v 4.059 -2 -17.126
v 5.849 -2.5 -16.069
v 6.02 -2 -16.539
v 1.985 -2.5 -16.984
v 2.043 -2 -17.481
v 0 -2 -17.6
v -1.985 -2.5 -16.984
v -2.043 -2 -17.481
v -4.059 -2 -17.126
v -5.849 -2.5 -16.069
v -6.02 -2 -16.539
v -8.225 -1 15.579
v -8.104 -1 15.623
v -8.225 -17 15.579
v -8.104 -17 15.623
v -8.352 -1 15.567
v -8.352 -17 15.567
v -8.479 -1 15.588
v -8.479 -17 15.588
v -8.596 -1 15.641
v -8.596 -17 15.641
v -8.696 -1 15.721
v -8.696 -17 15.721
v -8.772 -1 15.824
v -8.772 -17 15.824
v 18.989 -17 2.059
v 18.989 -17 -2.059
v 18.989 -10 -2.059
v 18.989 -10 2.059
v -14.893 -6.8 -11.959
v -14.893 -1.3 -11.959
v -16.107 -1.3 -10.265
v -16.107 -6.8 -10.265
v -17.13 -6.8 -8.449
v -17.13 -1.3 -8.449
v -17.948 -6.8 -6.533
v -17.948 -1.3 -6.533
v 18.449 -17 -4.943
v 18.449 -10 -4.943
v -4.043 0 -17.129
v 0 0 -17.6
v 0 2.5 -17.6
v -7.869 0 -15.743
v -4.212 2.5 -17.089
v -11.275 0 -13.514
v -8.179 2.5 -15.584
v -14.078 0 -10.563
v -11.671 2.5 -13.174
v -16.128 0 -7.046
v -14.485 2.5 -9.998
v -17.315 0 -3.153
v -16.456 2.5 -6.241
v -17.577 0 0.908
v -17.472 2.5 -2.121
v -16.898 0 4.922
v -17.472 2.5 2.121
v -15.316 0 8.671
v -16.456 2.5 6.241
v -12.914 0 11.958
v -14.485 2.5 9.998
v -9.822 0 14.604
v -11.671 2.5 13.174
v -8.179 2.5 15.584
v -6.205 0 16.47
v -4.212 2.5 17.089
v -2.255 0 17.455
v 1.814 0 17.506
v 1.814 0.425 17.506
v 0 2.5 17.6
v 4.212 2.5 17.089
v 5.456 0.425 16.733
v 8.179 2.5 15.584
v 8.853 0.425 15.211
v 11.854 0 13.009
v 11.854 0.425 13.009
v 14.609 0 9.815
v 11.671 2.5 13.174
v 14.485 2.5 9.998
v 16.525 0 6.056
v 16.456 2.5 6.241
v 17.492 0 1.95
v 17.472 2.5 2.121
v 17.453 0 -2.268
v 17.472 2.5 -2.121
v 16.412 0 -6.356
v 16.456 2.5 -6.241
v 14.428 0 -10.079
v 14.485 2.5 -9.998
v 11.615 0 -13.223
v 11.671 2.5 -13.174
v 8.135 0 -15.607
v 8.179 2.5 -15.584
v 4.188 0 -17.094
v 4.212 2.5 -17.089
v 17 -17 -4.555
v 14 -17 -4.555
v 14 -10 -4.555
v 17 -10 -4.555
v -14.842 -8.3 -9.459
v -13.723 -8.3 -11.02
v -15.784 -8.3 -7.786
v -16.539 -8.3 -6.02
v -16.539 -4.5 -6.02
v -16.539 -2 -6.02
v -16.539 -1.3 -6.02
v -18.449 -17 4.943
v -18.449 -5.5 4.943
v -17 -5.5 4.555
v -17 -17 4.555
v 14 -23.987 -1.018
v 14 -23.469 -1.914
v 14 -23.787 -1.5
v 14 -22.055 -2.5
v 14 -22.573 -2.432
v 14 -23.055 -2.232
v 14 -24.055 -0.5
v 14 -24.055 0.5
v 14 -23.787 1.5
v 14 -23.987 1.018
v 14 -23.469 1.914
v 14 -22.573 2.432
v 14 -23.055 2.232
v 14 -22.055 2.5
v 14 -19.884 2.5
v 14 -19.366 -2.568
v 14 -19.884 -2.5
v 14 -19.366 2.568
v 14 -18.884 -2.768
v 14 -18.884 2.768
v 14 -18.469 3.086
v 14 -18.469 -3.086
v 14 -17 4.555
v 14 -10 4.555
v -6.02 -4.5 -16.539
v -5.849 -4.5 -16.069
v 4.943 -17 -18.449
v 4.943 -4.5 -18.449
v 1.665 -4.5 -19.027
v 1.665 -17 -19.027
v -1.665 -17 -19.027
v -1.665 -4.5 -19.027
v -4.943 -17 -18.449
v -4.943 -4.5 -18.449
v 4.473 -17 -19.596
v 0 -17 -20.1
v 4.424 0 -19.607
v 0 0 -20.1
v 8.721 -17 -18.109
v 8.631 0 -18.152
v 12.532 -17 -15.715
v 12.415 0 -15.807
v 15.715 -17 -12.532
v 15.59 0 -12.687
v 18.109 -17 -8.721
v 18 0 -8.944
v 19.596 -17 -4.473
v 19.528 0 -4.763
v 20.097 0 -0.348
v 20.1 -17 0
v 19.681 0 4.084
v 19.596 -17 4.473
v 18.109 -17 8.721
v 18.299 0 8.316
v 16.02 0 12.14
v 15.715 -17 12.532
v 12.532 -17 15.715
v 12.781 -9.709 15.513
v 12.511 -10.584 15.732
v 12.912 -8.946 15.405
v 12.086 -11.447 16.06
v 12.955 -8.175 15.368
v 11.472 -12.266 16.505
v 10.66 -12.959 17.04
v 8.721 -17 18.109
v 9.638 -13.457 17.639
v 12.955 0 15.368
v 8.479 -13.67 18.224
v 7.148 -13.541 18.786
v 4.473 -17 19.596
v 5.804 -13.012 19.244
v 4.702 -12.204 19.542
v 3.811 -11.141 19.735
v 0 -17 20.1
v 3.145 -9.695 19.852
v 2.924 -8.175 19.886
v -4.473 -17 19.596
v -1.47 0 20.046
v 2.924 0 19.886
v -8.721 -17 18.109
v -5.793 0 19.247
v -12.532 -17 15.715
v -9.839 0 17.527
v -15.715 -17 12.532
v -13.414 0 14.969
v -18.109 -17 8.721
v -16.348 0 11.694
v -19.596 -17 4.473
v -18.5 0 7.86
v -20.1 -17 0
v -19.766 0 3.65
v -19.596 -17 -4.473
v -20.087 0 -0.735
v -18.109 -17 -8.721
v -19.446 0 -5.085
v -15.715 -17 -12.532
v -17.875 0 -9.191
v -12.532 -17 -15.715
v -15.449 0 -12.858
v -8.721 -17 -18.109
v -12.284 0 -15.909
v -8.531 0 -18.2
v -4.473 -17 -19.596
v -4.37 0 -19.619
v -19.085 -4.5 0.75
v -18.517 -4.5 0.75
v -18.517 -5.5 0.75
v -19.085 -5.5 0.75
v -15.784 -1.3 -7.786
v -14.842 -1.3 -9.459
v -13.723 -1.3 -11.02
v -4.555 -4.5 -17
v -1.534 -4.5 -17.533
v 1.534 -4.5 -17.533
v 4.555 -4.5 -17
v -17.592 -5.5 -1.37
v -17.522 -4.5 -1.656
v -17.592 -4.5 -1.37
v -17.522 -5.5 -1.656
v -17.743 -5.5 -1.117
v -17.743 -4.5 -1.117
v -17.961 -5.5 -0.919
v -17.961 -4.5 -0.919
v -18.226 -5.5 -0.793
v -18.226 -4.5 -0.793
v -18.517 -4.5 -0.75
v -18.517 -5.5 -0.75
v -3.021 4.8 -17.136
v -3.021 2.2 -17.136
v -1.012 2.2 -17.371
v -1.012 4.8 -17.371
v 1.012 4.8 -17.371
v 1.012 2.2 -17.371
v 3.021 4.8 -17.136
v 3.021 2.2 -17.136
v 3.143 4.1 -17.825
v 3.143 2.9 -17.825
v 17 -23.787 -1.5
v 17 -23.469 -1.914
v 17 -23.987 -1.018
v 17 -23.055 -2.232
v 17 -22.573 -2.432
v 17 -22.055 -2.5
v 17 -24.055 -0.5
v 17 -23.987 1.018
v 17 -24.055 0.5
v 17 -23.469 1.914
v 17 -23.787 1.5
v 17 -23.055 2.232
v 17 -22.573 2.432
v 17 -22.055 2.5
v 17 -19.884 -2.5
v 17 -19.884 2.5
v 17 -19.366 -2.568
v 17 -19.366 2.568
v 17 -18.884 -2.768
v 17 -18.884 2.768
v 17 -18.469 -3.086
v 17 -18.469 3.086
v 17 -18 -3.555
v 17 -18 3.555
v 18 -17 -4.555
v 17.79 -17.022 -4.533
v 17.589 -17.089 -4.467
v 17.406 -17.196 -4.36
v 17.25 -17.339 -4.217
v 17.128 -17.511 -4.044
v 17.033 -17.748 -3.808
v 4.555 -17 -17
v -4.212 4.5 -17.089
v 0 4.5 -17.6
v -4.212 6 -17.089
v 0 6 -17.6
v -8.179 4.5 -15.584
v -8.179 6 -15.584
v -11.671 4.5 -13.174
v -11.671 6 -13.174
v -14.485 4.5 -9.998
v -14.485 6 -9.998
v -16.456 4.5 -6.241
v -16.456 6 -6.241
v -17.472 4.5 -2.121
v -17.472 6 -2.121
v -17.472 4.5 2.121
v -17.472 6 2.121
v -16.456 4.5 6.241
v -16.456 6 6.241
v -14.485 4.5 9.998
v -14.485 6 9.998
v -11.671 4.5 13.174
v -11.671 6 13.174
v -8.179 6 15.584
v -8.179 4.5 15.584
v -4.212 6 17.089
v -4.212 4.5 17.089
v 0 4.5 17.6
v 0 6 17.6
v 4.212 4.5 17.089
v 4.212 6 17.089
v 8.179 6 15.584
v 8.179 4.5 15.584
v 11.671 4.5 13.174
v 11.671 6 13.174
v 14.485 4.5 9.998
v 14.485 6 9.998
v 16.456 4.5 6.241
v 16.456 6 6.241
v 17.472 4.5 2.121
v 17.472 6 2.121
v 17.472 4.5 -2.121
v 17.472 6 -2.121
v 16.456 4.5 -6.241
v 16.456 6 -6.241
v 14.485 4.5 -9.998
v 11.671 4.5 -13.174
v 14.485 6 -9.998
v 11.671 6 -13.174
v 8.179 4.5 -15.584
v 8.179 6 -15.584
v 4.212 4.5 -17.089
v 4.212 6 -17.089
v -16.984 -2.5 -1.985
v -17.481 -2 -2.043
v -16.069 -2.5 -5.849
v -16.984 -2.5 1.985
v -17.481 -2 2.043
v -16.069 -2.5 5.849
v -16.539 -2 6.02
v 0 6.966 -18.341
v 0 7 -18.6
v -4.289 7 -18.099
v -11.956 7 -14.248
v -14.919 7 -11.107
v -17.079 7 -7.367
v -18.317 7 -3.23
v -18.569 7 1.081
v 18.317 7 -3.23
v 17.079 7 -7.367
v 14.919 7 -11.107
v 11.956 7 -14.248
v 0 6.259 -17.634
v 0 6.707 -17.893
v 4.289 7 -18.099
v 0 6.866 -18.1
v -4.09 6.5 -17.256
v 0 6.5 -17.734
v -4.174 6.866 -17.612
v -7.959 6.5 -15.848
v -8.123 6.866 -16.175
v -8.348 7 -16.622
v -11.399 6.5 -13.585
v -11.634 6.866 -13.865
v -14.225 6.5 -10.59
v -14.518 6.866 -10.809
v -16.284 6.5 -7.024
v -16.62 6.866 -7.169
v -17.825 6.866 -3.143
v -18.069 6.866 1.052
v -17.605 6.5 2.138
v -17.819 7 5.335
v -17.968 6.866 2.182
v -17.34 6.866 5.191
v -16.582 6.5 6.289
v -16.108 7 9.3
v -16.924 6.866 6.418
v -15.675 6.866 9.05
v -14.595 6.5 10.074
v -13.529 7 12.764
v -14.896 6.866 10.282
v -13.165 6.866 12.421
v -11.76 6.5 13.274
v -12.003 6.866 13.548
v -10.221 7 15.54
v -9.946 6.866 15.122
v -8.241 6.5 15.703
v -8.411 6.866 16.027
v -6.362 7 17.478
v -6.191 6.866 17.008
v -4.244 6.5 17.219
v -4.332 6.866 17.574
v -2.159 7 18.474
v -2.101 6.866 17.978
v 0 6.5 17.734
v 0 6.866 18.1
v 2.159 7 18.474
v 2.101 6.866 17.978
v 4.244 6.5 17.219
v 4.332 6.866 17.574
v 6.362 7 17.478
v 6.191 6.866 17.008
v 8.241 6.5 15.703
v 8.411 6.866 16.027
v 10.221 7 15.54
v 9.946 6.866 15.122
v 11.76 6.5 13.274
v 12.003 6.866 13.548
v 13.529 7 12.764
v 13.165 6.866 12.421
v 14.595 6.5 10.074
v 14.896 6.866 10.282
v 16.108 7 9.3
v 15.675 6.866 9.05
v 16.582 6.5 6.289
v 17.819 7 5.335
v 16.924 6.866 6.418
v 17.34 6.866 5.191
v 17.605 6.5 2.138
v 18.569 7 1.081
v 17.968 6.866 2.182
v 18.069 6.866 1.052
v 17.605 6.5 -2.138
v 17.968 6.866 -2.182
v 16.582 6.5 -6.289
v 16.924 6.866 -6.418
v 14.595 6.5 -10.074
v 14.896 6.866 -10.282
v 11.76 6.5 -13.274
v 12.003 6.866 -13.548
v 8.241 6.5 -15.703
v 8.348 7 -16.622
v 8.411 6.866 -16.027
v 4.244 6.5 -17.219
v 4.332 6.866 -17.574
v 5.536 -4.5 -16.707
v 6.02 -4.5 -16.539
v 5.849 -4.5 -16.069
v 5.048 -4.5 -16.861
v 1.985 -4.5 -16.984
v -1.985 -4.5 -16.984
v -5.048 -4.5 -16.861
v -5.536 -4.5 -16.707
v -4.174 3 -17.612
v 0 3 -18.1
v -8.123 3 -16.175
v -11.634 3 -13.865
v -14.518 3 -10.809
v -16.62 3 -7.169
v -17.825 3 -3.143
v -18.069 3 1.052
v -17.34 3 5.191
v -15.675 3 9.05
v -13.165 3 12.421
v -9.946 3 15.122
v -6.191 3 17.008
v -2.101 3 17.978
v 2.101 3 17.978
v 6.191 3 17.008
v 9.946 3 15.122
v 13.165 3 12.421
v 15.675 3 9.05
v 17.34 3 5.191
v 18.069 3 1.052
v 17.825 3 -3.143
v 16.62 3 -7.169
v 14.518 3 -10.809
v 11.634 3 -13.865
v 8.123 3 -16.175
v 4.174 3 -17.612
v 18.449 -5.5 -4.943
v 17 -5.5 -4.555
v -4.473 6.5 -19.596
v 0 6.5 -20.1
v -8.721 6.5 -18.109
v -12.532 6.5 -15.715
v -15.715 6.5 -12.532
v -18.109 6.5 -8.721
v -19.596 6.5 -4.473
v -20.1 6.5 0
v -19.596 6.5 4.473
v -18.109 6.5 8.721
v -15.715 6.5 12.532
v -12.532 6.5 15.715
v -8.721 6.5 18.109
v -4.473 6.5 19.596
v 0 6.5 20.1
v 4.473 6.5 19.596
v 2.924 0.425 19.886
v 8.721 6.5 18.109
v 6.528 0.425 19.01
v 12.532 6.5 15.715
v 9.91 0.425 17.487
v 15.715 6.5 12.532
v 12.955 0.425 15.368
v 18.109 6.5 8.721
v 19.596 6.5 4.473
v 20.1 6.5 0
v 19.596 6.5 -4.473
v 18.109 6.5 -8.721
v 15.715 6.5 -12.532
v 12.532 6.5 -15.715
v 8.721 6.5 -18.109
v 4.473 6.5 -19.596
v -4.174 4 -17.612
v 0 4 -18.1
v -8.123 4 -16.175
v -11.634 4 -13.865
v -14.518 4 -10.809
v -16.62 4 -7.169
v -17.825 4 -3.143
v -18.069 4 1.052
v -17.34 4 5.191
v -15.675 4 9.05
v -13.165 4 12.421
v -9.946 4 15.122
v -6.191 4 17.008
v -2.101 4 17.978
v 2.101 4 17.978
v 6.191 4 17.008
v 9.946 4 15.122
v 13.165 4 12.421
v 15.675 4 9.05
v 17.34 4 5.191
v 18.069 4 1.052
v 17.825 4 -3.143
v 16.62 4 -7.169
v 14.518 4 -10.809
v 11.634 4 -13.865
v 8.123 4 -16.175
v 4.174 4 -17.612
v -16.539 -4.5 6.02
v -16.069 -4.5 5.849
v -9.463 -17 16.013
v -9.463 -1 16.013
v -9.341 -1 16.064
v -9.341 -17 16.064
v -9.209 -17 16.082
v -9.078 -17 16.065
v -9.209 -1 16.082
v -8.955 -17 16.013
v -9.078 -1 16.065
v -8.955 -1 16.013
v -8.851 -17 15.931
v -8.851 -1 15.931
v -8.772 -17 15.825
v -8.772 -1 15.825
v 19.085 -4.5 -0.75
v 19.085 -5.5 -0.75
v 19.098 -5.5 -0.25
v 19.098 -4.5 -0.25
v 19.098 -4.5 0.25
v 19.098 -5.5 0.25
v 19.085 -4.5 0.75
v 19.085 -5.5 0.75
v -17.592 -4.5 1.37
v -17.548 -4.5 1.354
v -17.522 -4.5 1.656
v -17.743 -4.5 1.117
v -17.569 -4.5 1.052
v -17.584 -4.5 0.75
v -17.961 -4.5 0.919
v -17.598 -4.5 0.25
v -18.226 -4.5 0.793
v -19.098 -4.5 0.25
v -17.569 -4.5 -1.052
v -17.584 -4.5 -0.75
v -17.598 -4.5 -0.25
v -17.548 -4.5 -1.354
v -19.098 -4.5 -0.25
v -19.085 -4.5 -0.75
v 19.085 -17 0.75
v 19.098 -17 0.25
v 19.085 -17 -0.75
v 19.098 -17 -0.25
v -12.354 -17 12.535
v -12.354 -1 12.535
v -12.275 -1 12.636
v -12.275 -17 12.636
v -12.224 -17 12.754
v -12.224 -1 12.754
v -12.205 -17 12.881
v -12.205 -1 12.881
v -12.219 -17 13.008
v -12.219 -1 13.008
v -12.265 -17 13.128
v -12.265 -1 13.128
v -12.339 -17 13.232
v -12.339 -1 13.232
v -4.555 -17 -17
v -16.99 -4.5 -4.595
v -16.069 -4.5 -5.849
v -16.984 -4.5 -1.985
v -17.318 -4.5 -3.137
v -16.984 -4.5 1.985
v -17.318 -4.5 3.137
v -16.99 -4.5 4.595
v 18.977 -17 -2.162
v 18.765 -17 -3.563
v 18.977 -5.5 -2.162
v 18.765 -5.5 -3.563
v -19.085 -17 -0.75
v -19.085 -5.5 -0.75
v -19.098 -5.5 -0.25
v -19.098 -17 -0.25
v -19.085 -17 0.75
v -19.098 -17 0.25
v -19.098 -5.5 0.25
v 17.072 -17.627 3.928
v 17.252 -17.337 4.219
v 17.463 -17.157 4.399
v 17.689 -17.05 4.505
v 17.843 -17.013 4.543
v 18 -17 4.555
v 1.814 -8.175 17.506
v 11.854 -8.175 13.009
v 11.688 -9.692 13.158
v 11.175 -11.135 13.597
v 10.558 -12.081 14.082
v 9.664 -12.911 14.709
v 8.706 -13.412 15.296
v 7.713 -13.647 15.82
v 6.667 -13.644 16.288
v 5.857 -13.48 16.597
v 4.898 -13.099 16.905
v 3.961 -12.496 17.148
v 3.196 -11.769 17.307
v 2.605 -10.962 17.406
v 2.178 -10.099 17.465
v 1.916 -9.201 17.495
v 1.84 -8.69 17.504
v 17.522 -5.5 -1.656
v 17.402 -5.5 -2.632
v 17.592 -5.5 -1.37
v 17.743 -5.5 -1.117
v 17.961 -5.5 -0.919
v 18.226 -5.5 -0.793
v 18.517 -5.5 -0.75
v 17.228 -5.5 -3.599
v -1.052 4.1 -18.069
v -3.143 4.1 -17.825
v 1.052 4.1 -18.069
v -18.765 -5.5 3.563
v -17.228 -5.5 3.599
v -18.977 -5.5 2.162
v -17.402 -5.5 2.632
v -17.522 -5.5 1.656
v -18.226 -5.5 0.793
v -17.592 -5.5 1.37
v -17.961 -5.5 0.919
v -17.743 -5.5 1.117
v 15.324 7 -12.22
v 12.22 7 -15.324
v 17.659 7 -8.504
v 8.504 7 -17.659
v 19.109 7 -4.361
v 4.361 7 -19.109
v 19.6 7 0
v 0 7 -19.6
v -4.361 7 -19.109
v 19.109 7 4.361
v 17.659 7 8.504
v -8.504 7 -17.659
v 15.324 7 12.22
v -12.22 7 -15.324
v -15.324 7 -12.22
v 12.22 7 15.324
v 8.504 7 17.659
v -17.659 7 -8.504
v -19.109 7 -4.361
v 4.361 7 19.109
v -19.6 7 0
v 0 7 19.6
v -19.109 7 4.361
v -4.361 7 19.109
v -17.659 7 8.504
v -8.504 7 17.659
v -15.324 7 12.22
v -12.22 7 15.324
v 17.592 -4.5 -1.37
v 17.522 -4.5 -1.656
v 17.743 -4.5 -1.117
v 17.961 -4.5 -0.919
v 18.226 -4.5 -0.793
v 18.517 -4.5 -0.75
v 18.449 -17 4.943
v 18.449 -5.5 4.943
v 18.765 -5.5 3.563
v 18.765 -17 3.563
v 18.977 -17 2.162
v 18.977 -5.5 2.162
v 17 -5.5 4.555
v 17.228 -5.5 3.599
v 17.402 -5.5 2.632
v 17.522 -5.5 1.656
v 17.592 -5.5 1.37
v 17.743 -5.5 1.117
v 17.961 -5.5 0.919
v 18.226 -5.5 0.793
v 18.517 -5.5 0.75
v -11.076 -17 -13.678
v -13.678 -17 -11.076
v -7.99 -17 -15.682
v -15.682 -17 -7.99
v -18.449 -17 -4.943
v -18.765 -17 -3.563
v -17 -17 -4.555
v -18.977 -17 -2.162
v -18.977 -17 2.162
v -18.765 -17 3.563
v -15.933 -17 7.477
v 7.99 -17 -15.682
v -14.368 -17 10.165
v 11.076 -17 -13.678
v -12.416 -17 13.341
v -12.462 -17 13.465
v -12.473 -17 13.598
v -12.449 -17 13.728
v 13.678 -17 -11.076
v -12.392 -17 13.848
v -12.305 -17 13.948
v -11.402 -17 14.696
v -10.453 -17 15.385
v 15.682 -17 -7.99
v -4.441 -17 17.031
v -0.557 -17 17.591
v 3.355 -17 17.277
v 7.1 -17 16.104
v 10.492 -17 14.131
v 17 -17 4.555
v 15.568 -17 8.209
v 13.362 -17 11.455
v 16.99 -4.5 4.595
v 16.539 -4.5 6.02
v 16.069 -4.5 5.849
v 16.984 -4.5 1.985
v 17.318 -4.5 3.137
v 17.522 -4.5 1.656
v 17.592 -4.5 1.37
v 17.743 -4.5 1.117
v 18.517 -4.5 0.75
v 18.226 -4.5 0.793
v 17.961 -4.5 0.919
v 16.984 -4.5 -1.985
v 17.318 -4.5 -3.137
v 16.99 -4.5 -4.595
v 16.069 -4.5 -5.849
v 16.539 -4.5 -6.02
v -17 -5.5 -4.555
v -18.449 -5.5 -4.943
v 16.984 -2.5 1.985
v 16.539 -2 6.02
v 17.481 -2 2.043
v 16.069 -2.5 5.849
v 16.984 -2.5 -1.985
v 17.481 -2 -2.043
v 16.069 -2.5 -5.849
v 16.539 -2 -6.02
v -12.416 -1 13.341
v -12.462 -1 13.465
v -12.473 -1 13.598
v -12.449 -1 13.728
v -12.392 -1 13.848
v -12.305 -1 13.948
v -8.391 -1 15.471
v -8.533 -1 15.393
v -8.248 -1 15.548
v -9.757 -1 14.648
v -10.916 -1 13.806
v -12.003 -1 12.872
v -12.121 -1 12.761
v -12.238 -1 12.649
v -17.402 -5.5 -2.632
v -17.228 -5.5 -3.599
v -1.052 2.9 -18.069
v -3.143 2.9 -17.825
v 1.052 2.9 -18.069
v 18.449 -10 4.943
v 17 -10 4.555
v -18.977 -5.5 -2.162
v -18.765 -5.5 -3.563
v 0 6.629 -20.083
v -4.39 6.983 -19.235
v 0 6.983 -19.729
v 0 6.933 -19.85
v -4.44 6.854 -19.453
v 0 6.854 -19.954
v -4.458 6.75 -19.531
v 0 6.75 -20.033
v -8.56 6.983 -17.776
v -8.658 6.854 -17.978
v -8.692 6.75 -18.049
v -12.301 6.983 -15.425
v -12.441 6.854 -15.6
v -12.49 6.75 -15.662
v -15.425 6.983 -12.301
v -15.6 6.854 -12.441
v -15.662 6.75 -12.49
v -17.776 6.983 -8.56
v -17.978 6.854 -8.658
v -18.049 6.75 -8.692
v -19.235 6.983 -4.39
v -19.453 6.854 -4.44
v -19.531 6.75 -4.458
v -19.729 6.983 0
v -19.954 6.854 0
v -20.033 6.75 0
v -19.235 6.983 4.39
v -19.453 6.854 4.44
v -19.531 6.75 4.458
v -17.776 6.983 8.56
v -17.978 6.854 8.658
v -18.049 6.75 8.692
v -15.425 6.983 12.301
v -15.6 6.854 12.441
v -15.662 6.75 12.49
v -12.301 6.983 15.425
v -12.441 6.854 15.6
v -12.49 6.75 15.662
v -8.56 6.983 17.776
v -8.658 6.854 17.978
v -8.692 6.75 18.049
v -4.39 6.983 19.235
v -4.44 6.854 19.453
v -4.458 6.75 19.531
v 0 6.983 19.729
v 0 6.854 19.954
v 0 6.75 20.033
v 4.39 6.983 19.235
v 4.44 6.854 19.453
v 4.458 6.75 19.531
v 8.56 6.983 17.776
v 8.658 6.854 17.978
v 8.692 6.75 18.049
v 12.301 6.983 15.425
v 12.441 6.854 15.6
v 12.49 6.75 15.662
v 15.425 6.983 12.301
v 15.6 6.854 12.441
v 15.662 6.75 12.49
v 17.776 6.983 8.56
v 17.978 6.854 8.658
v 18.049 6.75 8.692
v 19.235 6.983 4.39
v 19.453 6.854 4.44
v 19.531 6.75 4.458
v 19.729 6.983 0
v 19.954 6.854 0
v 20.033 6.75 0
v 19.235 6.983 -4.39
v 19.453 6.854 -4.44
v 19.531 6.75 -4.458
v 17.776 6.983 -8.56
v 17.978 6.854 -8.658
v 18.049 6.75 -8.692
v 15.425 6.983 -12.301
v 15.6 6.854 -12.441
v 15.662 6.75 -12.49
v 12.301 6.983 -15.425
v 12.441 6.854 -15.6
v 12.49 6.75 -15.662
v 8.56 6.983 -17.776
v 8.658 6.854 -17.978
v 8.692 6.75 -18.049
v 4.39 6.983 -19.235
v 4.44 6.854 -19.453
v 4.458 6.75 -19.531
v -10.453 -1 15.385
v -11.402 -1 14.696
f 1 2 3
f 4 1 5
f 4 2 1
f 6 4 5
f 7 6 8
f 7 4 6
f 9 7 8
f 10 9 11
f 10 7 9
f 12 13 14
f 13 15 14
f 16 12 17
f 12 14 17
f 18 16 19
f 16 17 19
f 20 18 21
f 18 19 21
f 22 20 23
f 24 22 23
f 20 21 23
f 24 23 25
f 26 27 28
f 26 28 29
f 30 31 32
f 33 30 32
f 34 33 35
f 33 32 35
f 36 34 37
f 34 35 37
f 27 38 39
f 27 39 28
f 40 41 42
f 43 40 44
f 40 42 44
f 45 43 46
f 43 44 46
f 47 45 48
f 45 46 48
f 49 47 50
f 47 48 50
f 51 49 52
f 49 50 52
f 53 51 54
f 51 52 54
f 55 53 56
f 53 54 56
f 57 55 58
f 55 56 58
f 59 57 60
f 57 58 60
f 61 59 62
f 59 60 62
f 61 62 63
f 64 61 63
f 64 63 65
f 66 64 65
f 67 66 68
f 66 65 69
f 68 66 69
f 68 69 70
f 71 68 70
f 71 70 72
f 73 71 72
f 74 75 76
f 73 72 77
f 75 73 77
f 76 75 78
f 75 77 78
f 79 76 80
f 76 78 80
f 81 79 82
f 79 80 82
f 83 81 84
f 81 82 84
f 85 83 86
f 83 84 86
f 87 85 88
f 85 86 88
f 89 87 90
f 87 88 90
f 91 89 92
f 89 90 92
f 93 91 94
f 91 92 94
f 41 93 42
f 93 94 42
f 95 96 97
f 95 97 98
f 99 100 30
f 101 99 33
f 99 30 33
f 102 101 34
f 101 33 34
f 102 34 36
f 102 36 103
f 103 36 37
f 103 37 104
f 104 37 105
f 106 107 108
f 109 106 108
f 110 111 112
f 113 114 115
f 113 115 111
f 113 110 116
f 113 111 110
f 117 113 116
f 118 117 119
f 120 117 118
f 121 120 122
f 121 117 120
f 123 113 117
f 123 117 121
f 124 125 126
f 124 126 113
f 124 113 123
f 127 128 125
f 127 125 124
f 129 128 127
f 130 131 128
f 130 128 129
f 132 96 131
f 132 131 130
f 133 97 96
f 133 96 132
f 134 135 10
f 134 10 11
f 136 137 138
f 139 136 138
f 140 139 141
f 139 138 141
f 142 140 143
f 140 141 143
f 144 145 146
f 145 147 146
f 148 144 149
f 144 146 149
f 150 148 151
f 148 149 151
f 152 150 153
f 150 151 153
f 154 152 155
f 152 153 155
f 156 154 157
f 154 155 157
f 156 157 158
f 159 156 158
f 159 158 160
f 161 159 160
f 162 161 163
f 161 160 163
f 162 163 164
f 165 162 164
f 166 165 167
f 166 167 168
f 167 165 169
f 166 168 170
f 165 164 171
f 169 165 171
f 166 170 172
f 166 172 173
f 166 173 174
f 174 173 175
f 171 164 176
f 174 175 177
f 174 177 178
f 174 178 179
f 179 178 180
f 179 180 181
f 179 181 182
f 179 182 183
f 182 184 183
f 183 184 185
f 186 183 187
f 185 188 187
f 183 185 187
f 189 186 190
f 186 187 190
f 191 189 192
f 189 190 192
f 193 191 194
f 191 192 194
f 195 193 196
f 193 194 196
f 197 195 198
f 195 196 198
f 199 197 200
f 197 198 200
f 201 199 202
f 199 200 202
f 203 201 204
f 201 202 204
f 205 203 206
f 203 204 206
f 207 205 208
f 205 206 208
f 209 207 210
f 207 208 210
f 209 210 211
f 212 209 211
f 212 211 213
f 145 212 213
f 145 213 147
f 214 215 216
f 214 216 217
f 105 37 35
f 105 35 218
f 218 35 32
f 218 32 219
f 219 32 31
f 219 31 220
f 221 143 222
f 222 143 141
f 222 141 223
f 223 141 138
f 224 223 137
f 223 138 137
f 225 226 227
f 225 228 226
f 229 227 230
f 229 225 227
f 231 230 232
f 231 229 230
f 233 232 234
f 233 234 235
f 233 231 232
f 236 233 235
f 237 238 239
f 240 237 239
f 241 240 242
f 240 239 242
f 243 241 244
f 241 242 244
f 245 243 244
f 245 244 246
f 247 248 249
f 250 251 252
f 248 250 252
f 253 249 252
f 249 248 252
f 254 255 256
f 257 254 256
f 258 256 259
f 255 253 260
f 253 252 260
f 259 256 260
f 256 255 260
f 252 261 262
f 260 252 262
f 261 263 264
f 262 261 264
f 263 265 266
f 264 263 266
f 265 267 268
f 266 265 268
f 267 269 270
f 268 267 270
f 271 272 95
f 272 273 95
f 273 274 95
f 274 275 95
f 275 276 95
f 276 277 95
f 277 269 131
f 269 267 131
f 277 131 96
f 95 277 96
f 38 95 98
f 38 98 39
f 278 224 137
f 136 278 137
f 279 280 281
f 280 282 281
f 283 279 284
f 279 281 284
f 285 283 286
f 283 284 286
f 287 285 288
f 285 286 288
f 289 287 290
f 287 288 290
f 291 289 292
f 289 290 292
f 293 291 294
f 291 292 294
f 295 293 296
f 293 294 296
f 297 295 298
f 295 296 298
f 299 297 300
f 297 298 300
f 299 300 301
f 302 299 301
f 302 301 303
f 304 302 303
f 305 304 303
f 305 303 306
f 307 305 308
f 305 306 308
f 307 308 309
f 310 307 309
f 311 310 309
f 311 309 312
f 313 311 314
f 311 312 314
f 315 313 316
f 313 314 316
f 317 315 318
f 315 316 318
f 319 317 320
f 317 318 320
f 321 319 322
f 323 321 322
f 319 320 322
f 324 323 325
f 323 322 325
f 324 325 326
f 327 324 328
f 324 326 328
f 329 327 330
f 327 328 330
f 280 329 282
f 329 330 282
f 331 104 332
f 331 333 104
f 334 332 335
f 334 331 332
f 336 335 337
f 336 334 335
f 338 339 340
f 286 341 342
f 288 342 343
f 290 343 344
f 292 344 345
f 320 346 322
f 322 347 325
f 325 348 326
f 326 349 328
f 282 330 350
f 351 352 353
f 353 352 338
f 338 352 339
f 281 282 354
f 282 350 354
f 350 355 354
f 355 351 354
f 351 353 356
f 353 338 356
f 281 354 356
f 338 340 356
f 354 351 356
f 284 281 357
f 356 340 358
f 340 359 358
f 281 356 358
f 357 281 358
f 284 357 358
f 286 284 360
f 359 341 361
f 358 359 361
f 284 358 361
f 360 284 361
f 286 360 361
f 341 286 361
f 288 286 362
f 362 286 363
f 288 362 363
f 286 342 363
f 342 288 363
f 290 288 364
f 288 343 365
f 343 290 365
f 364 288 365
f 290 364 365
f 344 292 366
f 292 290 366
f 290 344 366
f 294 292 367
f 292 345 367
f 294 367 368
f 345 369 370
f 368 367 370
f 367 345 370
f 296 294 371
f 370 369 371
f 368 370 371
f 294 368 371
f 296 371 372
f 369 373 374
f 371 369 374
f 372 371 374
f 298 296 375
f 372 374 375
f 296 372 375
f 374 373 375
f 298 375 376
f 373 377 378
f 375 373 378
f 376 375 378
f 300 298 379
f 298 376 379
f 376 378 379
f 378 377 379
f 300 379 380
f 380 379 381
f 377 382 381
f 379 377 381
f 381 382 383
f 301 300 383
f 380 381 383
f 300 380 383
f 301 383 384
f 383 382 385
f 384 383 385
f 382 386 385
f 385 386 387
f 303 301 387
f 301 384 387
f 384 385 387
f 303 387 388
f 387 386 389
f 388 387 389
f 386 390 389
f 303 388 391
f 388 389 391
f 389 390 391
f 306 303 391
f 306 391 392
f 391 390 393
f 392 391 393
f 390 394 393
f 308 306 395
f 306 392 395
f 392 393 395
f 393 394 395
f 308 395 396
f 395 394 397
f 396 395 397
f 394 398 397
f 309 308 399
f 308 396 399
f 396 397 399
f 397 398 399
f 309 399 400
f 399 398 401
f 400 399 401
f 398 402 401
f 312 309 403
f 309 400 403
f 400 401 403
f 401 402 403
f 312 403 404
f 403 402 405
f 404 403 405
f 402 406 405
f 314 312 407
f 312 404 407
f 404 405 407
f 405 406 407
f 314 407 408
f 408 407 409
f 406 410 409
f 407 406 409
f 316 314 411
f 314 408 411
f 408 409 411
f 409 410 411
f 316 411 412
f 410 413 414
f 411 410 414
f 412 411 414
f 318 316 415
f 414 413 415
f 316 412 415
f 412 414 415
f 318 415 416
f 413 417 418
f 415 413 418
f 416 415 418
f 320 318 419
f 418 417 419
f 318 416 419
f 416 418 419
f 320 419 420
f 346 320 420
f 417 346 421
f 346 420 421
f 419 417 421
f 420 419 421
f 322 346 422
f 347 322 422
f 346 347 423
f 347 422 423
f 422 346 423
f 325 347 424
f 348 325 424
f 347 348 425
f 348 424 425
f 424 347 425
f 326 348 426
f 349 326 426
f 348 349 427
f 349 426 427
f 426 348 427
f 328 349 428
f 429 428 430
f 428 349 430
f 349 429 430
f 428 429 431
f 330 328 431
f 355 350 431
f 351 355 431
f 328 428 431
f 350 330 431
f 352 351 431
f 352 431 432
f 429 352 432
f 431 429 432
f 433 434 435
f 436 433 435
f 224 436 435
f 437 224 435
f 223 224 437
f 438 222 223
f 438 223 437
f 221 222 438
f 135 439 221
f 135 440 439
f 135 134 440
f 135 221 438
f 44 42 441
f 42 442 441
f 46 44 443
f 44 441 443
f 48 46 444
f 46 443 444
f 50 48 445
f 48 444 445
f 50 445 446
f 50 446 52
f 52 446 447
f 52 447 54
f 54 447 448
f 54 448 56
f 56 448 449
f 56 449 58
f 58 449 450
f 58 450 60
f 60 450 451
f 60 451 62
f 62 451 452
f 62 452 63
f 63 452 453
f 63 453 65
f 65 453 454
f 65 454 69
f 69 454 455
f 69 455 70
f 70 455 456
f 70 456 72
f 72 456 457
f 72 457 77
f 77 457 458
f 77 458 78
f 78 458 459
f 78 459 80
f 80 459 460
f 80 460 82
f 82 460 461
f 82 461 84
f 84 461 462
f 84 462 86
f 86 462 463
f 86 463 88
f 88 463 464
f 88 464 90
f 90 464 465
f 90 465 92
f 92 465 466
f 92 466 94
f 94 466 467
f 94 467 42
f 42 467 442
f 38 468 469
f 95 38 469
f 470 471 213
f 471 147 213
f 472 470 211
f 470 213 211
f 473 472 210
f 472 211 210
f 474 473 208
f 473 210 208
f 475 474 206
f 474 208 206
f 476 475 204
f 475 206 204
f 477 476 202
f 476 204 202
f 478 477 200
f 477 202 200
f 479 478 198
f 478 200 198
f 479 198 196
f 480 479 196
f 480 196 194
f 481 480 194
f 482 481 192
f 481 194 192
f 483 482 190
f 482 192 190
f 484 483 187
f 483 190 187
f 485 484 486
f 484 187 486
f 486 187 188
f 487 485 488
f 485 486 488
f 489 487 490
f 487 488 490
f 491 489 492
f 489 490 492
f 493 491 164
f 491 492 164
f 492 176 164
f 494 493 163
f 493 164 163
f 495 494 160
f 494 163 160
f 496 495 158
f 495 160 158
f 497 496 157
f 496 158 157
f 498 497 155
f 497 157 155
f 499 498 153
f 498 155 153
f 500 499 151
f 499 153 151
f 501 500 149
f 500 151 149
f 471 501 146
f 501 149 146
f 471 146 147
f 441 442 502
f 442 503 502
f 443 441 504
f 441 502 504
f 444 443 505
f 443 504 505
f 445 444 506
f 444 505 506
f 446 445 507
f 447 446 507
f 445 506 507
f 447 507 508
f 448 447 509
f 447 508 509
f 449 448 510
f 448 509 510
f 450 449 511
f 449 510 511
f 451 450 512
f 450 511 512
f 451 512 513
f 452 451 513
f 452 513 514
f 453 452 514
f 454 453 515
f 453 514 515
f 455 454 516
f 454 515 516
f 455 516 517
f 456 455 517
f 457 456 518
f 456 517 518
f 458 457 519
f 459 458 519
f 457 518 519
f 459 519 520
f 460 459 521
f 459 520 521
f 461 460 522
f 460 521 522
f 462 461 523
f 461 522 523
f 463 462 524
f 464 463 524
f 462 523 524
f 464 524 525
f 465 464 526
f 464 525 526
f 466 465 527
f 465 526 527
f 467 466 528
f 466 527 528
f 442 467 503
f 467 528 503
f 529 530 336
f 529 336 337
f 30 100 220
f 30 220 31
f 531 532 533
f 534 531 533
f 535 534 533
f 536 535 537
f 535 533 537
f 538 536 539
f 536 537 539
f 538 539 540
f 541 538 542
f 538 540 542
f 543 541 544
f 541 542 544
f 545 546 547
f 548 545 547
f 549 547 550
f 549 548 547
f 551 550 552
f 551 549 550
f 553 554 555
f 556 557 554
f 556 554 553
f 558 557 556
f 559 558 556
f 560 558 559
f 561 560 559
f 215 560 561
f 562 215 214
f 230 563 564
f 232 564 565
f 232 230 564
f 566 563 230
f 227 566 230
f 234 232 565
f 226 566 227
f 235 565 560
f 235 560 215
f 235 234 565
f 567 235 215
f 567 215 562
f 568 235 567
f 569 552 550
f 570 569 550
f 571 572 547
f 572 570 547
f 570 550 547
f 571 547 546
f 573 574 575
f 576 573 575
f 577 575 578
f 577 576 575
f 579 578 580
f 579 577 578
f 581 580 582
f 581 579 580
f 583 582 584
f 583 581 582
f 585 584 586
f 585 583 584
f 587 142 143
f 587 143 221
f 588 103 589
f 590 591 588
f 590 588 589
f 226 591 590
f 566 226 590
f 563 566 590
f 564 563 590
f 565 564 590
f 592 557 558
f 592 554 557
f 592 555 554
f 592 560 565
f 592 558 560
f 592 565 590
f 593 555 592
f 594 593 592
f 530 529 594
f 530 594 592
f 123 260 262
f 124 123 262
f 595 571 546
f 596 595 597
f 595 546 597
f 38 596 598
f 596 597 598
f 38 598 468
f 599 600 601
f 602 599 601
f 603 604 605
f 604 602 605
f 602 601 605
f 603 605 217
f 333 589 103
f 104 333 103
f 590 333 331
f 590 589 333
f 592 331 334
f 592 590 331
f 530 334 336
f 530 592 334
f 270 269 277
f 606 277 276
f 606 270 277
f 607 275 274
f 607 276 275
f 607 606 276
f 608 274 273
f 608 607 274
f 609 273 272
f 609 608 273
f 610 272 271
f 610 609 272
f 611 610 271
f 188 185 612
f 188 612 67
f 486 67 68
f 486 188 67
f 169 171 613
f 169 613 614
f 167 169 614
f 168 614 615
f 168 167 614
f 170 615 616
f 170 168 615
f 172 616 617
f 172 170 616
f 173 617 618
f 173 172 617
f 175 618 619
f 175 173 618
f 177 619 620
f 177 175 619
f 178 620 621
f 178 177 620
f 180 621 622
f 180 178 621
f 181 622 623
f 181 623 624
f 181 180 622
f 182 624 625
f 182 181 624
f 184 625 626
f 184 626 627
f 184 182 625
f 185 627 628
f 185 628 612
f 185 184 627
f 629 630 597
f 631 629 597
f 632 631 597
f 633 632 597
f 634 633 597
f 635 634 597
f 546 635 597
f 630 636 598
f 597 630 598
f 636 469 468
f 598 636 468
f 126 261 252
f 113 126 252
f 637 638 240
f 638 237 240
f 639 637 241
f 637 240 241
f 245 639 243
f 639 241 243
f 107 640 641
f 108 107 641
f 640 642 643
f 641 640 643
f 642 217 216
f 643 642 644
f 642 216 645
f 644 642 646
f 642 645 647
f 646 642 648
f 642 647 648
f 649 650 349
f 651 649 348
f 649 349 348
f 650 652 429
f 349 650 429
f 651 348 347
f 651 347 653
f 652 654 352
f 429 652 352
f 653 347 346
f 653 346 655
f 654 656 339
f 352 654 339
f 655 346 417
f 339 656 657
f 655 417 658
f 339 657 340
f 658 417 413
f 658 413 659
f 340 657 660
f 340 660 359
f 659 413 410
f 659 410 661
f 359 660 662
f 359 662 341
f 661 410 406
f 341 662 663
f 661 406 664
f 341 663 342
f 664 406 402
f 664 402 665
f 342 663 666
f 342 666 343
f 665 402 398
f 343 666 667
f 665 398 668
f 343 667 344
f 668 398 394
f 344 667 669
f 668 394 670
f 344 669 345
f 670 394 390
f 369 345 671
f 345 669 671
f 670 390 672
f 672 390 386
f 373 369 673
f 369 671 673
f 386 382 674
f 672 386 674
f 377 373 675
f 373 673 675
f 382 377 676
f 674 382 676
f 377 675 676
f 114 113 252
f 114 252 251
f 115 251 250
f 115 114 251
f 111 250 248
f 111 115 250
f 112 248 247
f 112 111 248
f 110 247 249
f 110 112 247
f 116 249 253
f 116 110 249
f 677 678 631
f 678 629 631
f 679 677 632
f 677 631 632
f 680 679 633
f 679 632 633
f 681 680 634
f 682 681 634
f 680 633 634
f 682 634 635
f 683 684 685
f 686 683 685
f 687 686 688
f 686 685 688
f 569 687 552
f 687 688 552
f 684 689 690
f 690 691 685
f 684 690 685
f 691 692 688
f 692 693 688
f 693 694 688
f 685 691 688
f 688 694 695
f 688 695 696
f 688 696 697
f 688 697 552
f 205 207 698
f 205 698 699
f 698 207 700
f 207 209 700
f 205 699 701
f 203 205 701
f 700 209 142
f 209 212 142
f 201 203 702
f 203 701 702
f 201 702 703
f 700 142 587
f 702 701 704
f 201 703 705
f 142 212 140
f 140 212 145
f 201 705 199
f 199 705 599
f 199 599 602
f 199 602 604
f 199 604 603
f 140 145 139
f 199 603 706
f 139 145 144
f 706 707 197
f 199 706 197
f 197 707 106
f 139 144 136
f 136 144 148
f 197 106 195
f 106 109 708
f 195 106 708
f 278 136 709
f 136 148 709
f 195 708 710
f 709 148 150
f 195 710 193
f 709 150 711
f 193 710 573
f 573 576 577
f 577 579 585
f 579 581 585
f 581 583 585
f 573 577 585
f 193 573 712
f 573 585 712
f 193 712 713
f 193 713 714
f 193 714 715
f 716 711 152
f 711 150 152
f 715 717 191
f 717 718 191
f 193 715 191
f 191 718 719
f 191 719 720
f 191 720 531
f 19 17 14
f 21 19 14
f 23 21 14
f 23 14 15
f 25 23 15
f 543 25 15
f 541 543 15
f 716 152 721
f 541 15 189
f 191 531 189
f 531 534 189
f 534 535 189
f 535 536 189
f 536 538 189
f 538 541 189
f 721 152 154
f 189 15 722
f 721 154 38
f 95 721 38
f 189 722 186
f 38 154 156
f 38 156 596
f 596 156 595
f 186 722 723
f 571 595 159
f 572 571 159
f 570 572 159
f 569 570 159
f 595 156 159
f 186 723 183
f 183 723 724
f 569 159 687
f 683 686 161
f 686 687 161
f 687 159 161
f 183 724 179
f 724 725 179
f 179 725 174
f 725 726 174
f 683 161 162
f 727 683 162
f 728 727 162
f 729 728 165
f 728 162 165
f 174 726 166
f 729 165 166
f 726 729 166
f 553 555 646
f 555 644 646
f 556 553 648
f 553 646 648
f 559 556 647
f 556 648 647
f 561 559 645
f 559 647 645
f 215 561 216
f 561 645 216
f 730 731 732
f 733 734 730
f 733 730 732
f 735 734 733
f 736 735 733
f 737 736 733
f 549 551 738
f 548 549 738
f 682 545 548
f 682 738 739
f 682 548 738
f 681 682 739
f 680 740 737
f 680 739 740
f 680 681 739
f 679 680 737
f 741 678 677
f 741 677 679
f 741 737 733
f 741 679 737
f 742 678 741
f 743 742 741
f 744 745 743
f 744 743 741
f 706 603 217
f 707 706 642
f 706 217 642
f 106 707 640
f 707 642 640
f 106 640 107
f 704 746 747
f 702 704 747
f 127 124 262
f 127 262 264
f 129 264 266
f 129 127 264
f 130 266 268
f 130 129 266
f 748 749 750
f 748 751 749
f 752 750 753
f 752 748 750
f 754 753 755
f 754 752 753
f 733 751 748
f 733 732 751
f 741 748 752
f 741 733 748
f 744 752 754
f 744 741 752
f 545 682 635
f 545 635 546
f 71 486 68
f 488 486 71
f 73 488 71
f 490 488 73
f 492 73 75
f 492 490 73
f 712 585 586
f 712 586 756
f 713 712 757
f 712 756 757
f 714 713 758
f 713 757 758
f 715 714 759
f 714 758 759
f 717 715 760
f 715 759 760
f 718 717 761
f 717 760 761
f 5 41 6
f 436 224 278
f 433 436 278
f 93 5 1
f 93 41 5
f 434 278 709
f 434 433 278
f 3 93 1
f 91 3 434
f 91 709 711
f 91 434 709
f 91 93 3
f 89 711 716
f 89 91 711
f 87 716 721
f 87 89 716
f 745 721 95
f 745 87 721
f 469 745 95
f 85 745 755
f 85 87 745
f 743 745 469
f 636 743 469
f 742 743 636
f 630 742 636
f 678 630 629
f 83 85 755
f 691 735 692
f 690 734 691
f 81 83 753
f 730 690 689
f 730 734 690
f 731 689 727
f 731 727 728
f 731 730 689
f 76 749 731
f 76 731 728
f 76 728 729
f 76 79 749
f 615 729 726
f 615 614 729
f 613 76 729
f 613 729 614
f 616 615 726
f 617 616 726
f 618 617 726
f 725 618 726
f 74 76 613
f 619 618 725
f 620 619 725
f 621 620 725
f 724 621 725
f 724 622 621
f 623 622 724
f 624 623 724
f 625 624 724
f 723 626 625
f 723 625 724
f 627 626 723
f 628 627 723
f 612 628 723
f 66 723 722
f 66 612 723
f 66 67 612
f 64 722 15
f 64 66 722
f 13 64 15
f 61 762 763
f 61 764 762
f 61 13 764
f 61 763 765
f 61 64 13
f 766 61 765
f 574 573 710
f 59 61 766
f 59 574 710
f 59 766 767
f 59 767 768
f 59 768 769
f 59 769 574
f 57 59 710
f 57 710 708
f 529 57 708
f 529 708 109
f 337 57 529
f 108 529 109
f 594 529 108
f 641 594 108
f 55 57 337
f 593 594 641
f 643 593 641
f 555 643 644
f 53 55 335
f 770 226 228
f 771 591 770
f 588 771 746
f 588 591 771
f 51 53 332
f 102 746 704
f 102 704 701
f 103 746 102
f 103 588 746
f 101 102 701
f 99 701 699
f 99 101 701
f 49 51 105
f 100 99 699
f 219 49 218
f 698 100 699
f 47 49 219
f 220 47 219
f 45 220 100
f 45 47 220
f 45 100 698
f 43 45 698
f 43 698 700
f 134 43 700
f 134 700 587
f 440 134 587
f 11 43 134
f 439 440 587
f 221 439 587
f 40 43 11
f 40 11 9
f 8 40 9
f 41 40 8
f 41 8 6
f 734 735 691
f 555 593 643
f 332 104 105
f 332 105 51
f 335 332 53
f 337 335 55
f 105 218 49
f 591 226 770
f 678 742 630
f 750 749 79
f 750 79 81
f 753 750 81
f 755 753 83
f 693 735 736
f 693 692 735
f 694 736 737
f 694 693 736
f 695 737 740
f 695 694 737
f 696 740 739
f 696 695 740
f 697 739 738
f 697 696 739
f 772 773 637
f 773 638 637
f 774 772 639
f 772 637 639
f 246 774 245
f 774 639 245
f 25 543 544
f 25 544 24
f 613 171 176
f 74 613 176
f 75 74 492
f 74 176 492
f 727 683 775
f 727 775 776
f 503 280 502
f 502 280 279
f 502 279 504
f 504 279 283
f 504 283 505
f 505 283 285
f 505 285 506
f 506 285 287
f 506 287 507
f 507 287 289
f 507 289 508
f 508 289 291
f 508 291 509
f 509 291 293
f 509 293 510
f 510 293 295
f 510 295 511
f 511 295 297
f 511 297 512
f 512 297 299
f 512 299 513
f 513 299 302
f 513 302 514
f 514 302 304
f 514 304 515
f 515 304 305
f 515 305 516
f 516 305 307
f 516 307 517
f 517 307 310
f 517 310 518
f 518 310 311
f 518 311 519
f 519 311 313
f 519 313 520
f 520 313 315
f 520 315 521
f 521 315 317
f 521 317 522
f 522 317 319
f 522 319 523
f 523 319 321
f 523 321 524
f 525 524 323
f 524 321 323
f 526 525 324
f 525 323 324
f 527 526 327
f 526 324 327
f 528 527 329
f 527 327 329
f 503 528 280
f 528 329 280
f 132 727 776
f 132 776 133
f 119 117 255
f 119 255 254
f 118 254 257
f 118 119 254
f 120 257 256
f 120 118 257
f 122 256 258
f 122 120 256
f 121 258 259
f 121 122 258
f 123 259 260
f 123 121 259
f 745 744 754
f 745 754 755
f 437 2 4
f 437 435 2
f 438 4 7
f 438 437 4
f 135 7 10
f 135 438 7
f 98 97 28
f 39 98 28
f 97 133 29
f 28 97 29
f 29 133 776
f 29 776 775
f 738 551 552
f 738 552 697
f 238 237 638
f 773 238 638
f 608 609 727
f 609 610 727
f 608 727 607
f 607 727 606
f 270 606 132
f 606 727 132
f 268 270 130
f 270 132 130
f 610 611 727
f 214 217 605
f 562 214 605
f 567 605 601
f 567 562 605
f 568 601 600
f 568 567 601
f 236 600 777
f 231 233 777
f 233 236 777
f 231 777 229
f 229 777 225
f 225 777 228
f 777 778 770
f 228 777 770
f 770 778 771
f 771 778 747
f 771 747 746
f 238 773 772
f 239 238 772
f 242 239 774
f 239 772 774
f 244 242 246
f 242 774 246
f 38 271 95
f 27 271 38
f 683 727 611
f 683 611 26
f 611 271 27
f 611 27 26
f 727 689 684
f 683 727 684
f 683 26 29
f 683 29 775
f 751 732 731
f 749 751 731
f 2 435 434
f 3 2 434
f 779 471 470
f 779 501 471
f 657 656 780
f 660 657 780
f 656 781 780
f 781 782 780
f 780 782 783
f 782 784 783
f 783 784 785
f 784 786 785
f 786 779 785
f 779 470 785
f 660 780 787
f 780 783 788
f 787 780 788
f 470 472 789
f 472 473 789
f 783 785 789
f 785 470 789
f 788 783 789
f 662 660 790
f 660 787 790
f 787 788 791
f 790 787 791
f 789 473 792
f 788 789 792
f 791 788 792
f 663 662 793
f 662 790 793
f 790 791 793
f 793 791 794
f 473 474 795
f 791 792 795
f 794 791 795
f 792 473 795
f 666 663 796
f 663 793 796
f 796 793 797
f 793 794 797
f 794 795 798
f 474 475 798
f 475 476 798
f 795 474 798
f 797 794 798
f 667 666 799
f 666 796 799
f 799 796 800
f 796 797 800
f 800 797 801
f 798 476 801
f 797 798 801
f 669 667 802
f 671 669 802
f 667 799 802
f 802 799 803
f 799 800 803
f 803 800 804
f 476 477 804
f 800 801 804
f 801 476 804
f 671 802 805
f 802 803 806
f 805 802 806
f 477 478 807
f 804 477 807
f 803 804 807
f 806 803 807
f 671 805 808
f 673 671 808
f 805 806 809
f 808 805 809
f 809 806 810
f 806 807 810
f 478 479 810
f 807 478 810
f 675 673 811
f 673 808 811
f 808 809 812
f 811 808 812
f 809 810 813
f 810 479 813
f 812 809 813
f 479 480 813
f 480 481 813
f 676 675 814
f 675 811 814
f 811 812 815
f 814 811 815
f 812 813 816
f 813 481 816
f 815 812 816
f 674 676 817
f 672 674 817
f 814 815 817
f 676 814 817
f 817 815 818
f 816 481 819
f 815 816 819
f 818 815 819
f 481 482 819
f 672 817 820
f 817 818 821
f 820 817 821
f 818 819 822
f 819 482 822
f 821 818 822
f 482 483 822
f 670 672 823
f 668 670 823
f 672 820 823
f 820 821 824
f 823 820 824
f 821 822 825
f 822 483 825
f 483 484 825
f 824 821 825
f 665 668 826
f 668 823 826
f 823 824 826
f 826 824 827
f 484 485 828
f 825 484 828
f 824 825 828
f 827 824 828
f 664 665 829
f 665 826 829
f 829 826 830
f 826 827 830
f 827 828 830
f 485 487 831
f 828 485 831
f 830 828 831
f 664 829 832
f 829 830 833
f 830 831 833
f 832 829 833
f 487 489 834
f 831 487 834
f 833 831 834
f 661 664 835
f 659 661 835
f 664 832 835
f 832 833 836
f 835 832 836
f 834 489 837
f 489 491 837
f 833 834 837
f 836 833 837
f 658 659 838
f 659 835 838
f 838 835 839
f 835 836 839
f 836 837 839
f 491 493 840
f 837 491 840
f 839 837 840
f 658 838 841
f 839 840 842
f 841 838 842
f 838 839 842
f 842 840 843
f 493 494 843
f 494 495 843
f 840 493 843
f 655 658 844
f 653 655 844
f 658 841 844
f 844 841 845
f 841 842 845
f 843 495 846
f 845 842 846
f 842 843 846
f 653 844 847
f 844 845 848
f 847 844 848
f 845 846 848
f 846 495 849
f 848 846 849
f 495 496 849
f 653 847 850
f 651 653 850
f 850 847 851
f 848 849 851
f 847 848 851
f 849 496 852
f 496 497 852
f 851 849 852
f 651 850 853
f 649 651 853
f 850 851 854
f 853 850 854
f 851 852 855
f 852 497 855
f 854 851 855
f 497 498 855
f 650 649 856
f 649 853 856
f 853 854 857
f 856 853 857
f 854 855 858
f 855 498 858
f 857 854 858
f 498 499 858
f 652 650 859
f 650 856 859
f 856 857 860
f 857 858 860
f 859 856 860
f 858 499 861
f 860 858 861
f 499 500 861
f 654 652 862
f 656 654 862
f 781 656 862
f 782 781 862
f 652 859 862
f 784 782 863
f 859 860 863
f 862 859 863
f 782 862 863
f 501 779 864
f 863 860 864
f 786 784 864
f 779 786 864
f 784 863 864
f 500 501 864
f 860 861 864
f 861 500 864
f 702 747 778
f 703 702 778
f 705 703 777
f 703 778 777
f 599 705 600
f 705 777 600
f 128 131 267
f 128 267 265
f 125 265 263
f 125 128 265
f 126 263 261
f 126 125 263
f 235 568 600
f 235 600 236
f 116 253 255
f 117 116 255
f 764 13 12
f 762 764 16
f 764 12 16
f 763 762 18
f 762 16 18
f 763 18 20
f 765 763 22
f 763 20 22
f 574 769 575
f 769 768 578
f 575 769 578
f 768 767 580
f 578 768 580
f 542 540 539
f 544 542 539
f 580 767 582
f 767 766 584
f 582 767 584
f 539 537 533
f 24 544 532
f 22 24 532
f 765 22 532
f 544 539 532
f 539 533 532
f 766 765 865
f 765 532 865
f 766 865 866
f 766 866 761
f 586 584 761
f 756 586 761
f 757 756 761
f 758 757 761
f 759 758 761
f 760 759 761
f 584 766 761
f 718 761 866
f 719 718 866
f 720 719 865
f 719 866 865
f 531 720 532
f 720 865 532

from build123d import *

# Parameters (mm, degrees)
REVOLVE4_ANGLE           = 10
REVOLVE4_OTHER_WAY_ANGLE = 10
SKETCH7_W                = 2.5
SKETCH7_H                = 17
REVOLVE6_ANGLE           = 40
CUT_EXTRUDE2_START       = -16
CUT_EXTRUDE2_DEPTH       = 16
FILLET1_R                = 0.5
CUT_EXTRUDE3_START       = -12.5
CUT_EXTRUDE3_DEPTH       = 12.5
CUT_EXTRUDE4_START       = -11.5
CUT_EXTRUDE4_DEPTH       = 11.5
CUT_EXTRUDE5_START       = -12.5
CUT_EXTRUDE5_DEPTH       = 12.5
FILLET2_R                = 1
SKETCH13_W               = 11
SKETCH13_H               = 8.6
CUT_EXTRUDE6_DEPTH       = 5
CIRPATTERN1_COUNT        = 4
BOSS_EXTRUDE1_DEPTH      = 7
BOSS_EXTRUDE2_DEPTH      = 3
FILLET3_R                = 1
CUT_EXTRUDE7_DEPTH       = 2
CUT_EXTRUDE7_DEPTH_BACK  = 5
CHAMFER1_SIZE            = 1.5


# Read off the part's stored shape, not the designer's step: Revolve6
# Some blends are built 0.0001 mm under size
with BuildPart() as part:
    # Sketch1 → Revolve3 (revolve)
    with BuildSketch(Plane(origin=(0, 0, 0), x_dir=(0, 0, -1), z_dir=(1, 0, 0))):
        with BuildLine():
            Line((17.6, 0), (17.6, 2.5))
            Line((17.6, 2.5), (18.1, 3))
            Line((18.1, 3), (18.1, 4))
            Line((18.1, 4), (17.6, 4.5))
            Line((17.6, 4.5), (17.6, 6))
            ThreePointArc((17.6, 6), (17.892893219, 6.707106781), (18.6, 7))
            Line((18.6, 7), (19.6, 7))
            ThreePointArc((19.6, 7), (19.953553391, 6.853553391), (20.1, 6.5))
            Line((20.1, 6.5), (20.1, 0))
            Line((20.1, 0), (17.6, 0))
        make_face()
    revolve(axis=Axis((0, 0, 0), (0, 1, 0)))

    # Sketch7 → Revolve5 (revolve)
    with BuildSketch(Plane(origin=(0, 0, 0), x_dir=(0, 0, -1), z_dir=(1, 0, 0))):
        with Locations((18.85, -8.5)):
            Rectangle(SKETCH7_W, SKETCH7_H)
    revolve(axis=Axis((0, 9.361699771, 0), (0, -1, 0)))

    # Revolve6 outline → Revolve6 (revolve)
    with BuildSketch(Plane(origin=(0, 0, 0), x_dir=(0.3420201433256701, 0, -0.9396926207859079), z_dir=(0.9396926207859079, 0, 0.3420201433256701))):
        Polygon((17.1, -2.5), (17.1, -4.5), (17.6, -4.5), (17.6, -2), align=None)
    revolve6 = revolve(axis=Axis((0, 0, 0), (0, 1, 0)), revolution_arc=REVOLVE6_ANGLE)

    # Sketch11 → Cut-Extrude2 (cut)
    with BuildSketch(Plane.XZ.offset(17).offset(CUT_EXTRUDE2_START)):
        with BuildLine():
            Line((-8.771705355, 15.824575355), (-8.532649316, 15.393306846))
            ThreePointArc((-8.532649316, 15.393306846), (-10.34502044, 14.238699101), (-12.003171137, 12.871825148))
            Line((-12.003171137, 12.871825148), (-12.339459485, 13.23245025))
            ThreePointArc((-12.339459485, 13.23245025), (-12.47318933, 13.597800043), (-12.30455011, 13.948406597))
            ThreePointArc((-12.30455011, 13.948406597), (-10.932805693, 15.047716095), (-9.463407894, 16.012617245))
            ThreePointArc((-9.463407894, 16.012617245), (-9.077848861, 16.06465929), (-8.771705355, 15.824575355))
        make_face()
    extrude(amount=CUT_EXTRUDE2_DEPTH, mode=Mode.SUBTRACT)

    # Fillet1
    fillet1_edges = [part.edges().sort_by_distance(p)[0] for p in [
        (-12.003171137, -9, 12.871825148),
        (-8.532649316, -9, 15.393306846),
    ]]
    fillet(fillet1_edges, radius=FILLET1_R - 0.0001)  # a hair under: the kernel refuses the full size

    # Sketch8 → Cut-Extrude3 (cut)
    with BuildSketch(Plane(origin=(0, -17, 0), x_dir=(-1, 0, 0), z_dir=(0, -1, 0)).offset(CUT_EXTRUDE3_START)):
        with BuildLine():
            ThreePointArc((4.555215194, 17.000294543), (0, 17.6), (-4.555215194, 17.000294543))
            Line((-4.555215194, 17.000294543), (-4.943443761, 18.449183282))
            ThreePointArc((-4.943443761, 18.449183282), (0, 19.1), (4.943443761, 18.449183282))
            Line((4.943443761, 18.449183282), (4.555215194, 17.000294543))
        make_face()
    extrude(amount=CUT_EXTRUDE3_DEPTH, mode=Mode.SUBTRACT)

    # Sketch8<3> → Cut-Extrude4 (cut)
    with BuildSketch(Plane(origin=(0, -17, 0), x_dir=(-1, 0, 0), z_dir=(0, -1, 0)).offset(CUT_EXTRUDE4_START)):
        with BuildLine():
            Line((17.000294543, 4.555215194), (18.449183282, 4.943443761))
            ThreePointArc((18.449183282, 4.943443761), (19.1, 0), (18.449183282, -4.943443761))
            Line((18.449183282, -4.943443761), (17.000294543, -4.555215194))
            ThreePointArc((17.000294543, -4.555215194), (17.6, 0), (17.000294543, 4.555215194))
        make_face()
        with BuildLine():
            Line((-17.000294543, -4.555215194), (-18.449183282, -4.943443761))
            ThreePointArc((-18.449183282, -4.943443761), (-19.1, 0), (-18.449183282, 4.943443761))
            Line((-18.449183282, 4.943443761), (-17.000294543, 4.555215194))
            ThreePointArc((-17.000294543, 4.555215194), (-17.6, 0), (-17.000294543, -4.555215194))
        make_face()
    extrude(amount=CUT_EXTRUDE4_DEPTH, mode=Mode.SUBTRACT)

    # Sketch8<4> → Cut-Extrude5 (cut)
    with BuildSketch(Plane(origin=(0, -17, 0), x_dir=(-1, 0, 0), z_dir=(0, -1, 0)).offset(CUT_EXTRUDE5_START)):
        with BuildLine():
            Line((-19.085269189, -0.75), (-17.584012625, -0.75))
            ThreePointArc((-17.584012625, -0.75), (-17.6, 0), (-17.584012625, 0.75))
            Line((-17.584012625, 0.75), (-19.085269189, 0.75))
            ThreePointArc((-19.085269189, 0.75), (-19.1, 0), (-19.085269189, -0.75))
        make_face()
        with BuildLine():
            Line((19.085269189, 0.75), (17.584012625, 0.75))
            ThreePointArc((17.584012625, 0.75), (17.6, 0), (17.584012625, -0.75))
            Line((17.584012625, -0.75), (19.085269189, -0.75))
            ThreePointArc((19.085269189, -0.75), (19.1, 0), (19.085269189, 0.75))
        make_face()
    extrude(amount=CUT_EXTRUDE5_DEPTH, mode=Mode.SUBTRACT)

    # Fillet2
    fillet2_edges = [part.edges().sort_by_distance(p)[0] for p in [
        (17.584012625, -5, 0.75),
        (17.584012625, -5, -0.75),
        (-17.584012625, -5, -0.75),
        (-17.584012625, -5, 0.75),
    ]]
    fillet(fillet2_edges, radius=FILLET2_R)

    # Sketch13 → Cut-Extrude6 (cut)
    with BuildSketch(Plane(origin=(8.494627061, 0, 18.216786519), x_dir=(0.9063077870366499, 0, -0.42261826174069955), z_dir=(0.42261826174069955, 0, 0.9063077870366499))):
        with BuildLine():
            ThreePointArc((5.245888847, -8.175), (-0.254111153, -13.675), (-5.754111153, -8.175))
            Line((-5.754111153, -8.175), (5.245888847, -8.175))
        make_face()
        with Locations((-0.254111153, -3.875)):
            Rectangle(SKETCH13_W, SKETCH13_H)
    extrude(amount=-CUT_EXTRUDE6_DEPTH, mode=Mode.SUBTRACT)

    # CirPattern1: Revolve6 ×4 about axis, 1 skipped
    cirpattern1_axis = Axis((0, 7, 0), (0, -1, 0))
    add([revolve6.rotate(cirpattern1_axis, i * 360 / CIRPATTERN1_COUNT) for i in range(1, CIRPATTERN1_COUNT) if i not in (2,)])

    # Sketch17 → Cut-Extrude7 (cut, two sides: drawn at the far end of the back side and taken through both)
    with BuildSketch(Plane(origin=(0, -6.3, 0), x_dir=(-1, 0, 0), z_dir=(0, -1, 0)).offset(-CUT_EXTRUDE7_DEPTH_BACK)):
        with BuildLine():
            Line((17.948129057, 6.532584738), (16.538590126, 6.019554523))
            ThreePointArc((16.538590126, 6.019554523), (15.336093031, 8.635059382), (13.723316586, 11.019554523))
            Line((13.723316586, 11.019554523), (14.892917432, 11.958721101))
            ThreePointArc((14.892917432, 11.958721101), (16.643146415, 9.371001943), (17.948129057, 6.532584738))
        make_face()
    extrude(amount=CUT_EXTRUDE7_DEPTH + CUT_EXTRUDE7_DEPTH_BACK, mode=Mode.SUBTRACT)

    # Chamfer1
    chamfer1_edges = [part.edges().sort_by_distance(p)[0] for p in [
        (-16.643146415, -8.3, -9.371001943),
    ]]
    chamfer(chamfer1_edges, length=CHAMFER1_SIZE - 0.0001)  # a hair under: the kernel refuses the full size


with BuildPart() as body_2:
    # Sketch6 → Revolve4 (revolve)
    with BuildSketch(Plane(origin=(0, 0, 0), x_dir=(0, 0, -1), z_dir=(1, 0, 0))):
        Polygon((18.1, 4.1), (17.4, 4.8), (17.4, 2.2), (18.1, 2.9), (18.1, 3), (18.1, 4), align=None)
    revolve(axis=Axis((0, 0, 0), (0, 1, 0)), revolution_arc=REVOLVE4_ANGLE)

    # Sketch6 → Revolve4 other way (revolve)
    with BuildSketch(Plane(origin=(0, 0, 0), x_dir=(0, 0, -1), z_dir=(1, 0, 0))):
        Polygon((18.1, 4.1), (17.4, 4.8), (17.4, 2.2), (18.1, 2.9), (18.1, 3), (18.1, 4), align=None)
    revolve(axis=Axis((0, 0, 0), (0, -1, 0)), revolution_arc=REVOLVE4_OTHER_WAY_ANGLE)


with BuildPart() as body_3:
    # Sketch14 → Boss-Extrude1 (new body)
    with BuildSketch(Plane.XZ.offset(17)):
        Polygon((14.000294543, -4.555215194), (17.000294543, -4.555215194), (18.449183282, -4.943443761), (18.988728028, -2.05869082), (18.988728028, 2.05869082), (18.449183282, 4.943443761), (17.000294543, 4.555215194), (14.000294543, 4.555215194), align=None)
    extrude(amount=-BOSS_EXTRUDE1_DEPTH)

    # Sketch15 → Boss-Extrude2 (add)
    with BuildSketch(Plane.ZY.offset(-14.000294543)):
        with BuildLine():
            Line((-4.555215194, -17), (-3.085786438, -18.469428756))
            ThreePointArc((-3.085786438, -18.469428756), (-2.652240935, -19.118275454), (-2.5, -19.883642319))
            Line((-2.5, -19.883642319), (-2.5, -22.055215194))
            ThreePointArc((-2.5, -22.055215194), (-1.914213562, -23.469428756), (-0.5, -24.055215194))
            Line((-0.5, -24.055215194), (0.5, -24.055215194))
            ThreePointArc((0.5, -24.055215194), (1.914213562, -23.469428756), (2.5, -22.055215194))
            Line((2.5, -22.055215194), (2.5, -19.883642319))
            ThreePointArc((2.5, -19.883642319), (2.652240935, -19.118275454), (3.085786438, -18.469428756))
            Line((3.085786438, -18.469428756), (4.555215194, -17))
            Line((4.555215194, -17), (-4.555215194, -17))
        make_face()
    extrude(amount=-BOSS_EXTRUDE2_DEPTH)

    # Fillet3
    # the kernel refuses this fillet: 1 mm, written as the material it adds along each edge
    with BuildSketch(Plane(origin=(17.000294543, -17, 7.055215194), x_dir=(1, 0, 0), z_dir=(0, 0, -1))) as fillet3_piece_1_section:
        with BuildLine():
            CenterArc((FILLET3_R, FILLET3_R), FILLET3_R, 180, 90)
            Line((0, FILLET3_R), (0, 0))
            Line((0, 0), (FILLET3_R, 0))
        make_face()
    fillet3_piece_1 = extrude(amount=14.110430388, mode=Mode.PRIVATE)
    fillet3_piece_1 = split(fillet3_piece_1, bisect_by=Plane(origin=(17.233034532, -19.385437928, -2.169777266), z_dir=(0, 0.7071067811865458, 0.7071067811865492)), keep=Keep.TOP, mode=Mode.PRIVATE)
    fillet3_piece_1 = split(fillet3_piece_1, bisect_by=Plane(origin=(17.233034532, -19.385437928, 2.169777266), z_dir=(0, 0.7071067811865461, -0.7071067811865489)), keep=Keep.TOP, mode=Mode.PRIVATE)
    add(fillet3_piece_1)


solid = Compound([part.part, body_2.part, body_3.part])
